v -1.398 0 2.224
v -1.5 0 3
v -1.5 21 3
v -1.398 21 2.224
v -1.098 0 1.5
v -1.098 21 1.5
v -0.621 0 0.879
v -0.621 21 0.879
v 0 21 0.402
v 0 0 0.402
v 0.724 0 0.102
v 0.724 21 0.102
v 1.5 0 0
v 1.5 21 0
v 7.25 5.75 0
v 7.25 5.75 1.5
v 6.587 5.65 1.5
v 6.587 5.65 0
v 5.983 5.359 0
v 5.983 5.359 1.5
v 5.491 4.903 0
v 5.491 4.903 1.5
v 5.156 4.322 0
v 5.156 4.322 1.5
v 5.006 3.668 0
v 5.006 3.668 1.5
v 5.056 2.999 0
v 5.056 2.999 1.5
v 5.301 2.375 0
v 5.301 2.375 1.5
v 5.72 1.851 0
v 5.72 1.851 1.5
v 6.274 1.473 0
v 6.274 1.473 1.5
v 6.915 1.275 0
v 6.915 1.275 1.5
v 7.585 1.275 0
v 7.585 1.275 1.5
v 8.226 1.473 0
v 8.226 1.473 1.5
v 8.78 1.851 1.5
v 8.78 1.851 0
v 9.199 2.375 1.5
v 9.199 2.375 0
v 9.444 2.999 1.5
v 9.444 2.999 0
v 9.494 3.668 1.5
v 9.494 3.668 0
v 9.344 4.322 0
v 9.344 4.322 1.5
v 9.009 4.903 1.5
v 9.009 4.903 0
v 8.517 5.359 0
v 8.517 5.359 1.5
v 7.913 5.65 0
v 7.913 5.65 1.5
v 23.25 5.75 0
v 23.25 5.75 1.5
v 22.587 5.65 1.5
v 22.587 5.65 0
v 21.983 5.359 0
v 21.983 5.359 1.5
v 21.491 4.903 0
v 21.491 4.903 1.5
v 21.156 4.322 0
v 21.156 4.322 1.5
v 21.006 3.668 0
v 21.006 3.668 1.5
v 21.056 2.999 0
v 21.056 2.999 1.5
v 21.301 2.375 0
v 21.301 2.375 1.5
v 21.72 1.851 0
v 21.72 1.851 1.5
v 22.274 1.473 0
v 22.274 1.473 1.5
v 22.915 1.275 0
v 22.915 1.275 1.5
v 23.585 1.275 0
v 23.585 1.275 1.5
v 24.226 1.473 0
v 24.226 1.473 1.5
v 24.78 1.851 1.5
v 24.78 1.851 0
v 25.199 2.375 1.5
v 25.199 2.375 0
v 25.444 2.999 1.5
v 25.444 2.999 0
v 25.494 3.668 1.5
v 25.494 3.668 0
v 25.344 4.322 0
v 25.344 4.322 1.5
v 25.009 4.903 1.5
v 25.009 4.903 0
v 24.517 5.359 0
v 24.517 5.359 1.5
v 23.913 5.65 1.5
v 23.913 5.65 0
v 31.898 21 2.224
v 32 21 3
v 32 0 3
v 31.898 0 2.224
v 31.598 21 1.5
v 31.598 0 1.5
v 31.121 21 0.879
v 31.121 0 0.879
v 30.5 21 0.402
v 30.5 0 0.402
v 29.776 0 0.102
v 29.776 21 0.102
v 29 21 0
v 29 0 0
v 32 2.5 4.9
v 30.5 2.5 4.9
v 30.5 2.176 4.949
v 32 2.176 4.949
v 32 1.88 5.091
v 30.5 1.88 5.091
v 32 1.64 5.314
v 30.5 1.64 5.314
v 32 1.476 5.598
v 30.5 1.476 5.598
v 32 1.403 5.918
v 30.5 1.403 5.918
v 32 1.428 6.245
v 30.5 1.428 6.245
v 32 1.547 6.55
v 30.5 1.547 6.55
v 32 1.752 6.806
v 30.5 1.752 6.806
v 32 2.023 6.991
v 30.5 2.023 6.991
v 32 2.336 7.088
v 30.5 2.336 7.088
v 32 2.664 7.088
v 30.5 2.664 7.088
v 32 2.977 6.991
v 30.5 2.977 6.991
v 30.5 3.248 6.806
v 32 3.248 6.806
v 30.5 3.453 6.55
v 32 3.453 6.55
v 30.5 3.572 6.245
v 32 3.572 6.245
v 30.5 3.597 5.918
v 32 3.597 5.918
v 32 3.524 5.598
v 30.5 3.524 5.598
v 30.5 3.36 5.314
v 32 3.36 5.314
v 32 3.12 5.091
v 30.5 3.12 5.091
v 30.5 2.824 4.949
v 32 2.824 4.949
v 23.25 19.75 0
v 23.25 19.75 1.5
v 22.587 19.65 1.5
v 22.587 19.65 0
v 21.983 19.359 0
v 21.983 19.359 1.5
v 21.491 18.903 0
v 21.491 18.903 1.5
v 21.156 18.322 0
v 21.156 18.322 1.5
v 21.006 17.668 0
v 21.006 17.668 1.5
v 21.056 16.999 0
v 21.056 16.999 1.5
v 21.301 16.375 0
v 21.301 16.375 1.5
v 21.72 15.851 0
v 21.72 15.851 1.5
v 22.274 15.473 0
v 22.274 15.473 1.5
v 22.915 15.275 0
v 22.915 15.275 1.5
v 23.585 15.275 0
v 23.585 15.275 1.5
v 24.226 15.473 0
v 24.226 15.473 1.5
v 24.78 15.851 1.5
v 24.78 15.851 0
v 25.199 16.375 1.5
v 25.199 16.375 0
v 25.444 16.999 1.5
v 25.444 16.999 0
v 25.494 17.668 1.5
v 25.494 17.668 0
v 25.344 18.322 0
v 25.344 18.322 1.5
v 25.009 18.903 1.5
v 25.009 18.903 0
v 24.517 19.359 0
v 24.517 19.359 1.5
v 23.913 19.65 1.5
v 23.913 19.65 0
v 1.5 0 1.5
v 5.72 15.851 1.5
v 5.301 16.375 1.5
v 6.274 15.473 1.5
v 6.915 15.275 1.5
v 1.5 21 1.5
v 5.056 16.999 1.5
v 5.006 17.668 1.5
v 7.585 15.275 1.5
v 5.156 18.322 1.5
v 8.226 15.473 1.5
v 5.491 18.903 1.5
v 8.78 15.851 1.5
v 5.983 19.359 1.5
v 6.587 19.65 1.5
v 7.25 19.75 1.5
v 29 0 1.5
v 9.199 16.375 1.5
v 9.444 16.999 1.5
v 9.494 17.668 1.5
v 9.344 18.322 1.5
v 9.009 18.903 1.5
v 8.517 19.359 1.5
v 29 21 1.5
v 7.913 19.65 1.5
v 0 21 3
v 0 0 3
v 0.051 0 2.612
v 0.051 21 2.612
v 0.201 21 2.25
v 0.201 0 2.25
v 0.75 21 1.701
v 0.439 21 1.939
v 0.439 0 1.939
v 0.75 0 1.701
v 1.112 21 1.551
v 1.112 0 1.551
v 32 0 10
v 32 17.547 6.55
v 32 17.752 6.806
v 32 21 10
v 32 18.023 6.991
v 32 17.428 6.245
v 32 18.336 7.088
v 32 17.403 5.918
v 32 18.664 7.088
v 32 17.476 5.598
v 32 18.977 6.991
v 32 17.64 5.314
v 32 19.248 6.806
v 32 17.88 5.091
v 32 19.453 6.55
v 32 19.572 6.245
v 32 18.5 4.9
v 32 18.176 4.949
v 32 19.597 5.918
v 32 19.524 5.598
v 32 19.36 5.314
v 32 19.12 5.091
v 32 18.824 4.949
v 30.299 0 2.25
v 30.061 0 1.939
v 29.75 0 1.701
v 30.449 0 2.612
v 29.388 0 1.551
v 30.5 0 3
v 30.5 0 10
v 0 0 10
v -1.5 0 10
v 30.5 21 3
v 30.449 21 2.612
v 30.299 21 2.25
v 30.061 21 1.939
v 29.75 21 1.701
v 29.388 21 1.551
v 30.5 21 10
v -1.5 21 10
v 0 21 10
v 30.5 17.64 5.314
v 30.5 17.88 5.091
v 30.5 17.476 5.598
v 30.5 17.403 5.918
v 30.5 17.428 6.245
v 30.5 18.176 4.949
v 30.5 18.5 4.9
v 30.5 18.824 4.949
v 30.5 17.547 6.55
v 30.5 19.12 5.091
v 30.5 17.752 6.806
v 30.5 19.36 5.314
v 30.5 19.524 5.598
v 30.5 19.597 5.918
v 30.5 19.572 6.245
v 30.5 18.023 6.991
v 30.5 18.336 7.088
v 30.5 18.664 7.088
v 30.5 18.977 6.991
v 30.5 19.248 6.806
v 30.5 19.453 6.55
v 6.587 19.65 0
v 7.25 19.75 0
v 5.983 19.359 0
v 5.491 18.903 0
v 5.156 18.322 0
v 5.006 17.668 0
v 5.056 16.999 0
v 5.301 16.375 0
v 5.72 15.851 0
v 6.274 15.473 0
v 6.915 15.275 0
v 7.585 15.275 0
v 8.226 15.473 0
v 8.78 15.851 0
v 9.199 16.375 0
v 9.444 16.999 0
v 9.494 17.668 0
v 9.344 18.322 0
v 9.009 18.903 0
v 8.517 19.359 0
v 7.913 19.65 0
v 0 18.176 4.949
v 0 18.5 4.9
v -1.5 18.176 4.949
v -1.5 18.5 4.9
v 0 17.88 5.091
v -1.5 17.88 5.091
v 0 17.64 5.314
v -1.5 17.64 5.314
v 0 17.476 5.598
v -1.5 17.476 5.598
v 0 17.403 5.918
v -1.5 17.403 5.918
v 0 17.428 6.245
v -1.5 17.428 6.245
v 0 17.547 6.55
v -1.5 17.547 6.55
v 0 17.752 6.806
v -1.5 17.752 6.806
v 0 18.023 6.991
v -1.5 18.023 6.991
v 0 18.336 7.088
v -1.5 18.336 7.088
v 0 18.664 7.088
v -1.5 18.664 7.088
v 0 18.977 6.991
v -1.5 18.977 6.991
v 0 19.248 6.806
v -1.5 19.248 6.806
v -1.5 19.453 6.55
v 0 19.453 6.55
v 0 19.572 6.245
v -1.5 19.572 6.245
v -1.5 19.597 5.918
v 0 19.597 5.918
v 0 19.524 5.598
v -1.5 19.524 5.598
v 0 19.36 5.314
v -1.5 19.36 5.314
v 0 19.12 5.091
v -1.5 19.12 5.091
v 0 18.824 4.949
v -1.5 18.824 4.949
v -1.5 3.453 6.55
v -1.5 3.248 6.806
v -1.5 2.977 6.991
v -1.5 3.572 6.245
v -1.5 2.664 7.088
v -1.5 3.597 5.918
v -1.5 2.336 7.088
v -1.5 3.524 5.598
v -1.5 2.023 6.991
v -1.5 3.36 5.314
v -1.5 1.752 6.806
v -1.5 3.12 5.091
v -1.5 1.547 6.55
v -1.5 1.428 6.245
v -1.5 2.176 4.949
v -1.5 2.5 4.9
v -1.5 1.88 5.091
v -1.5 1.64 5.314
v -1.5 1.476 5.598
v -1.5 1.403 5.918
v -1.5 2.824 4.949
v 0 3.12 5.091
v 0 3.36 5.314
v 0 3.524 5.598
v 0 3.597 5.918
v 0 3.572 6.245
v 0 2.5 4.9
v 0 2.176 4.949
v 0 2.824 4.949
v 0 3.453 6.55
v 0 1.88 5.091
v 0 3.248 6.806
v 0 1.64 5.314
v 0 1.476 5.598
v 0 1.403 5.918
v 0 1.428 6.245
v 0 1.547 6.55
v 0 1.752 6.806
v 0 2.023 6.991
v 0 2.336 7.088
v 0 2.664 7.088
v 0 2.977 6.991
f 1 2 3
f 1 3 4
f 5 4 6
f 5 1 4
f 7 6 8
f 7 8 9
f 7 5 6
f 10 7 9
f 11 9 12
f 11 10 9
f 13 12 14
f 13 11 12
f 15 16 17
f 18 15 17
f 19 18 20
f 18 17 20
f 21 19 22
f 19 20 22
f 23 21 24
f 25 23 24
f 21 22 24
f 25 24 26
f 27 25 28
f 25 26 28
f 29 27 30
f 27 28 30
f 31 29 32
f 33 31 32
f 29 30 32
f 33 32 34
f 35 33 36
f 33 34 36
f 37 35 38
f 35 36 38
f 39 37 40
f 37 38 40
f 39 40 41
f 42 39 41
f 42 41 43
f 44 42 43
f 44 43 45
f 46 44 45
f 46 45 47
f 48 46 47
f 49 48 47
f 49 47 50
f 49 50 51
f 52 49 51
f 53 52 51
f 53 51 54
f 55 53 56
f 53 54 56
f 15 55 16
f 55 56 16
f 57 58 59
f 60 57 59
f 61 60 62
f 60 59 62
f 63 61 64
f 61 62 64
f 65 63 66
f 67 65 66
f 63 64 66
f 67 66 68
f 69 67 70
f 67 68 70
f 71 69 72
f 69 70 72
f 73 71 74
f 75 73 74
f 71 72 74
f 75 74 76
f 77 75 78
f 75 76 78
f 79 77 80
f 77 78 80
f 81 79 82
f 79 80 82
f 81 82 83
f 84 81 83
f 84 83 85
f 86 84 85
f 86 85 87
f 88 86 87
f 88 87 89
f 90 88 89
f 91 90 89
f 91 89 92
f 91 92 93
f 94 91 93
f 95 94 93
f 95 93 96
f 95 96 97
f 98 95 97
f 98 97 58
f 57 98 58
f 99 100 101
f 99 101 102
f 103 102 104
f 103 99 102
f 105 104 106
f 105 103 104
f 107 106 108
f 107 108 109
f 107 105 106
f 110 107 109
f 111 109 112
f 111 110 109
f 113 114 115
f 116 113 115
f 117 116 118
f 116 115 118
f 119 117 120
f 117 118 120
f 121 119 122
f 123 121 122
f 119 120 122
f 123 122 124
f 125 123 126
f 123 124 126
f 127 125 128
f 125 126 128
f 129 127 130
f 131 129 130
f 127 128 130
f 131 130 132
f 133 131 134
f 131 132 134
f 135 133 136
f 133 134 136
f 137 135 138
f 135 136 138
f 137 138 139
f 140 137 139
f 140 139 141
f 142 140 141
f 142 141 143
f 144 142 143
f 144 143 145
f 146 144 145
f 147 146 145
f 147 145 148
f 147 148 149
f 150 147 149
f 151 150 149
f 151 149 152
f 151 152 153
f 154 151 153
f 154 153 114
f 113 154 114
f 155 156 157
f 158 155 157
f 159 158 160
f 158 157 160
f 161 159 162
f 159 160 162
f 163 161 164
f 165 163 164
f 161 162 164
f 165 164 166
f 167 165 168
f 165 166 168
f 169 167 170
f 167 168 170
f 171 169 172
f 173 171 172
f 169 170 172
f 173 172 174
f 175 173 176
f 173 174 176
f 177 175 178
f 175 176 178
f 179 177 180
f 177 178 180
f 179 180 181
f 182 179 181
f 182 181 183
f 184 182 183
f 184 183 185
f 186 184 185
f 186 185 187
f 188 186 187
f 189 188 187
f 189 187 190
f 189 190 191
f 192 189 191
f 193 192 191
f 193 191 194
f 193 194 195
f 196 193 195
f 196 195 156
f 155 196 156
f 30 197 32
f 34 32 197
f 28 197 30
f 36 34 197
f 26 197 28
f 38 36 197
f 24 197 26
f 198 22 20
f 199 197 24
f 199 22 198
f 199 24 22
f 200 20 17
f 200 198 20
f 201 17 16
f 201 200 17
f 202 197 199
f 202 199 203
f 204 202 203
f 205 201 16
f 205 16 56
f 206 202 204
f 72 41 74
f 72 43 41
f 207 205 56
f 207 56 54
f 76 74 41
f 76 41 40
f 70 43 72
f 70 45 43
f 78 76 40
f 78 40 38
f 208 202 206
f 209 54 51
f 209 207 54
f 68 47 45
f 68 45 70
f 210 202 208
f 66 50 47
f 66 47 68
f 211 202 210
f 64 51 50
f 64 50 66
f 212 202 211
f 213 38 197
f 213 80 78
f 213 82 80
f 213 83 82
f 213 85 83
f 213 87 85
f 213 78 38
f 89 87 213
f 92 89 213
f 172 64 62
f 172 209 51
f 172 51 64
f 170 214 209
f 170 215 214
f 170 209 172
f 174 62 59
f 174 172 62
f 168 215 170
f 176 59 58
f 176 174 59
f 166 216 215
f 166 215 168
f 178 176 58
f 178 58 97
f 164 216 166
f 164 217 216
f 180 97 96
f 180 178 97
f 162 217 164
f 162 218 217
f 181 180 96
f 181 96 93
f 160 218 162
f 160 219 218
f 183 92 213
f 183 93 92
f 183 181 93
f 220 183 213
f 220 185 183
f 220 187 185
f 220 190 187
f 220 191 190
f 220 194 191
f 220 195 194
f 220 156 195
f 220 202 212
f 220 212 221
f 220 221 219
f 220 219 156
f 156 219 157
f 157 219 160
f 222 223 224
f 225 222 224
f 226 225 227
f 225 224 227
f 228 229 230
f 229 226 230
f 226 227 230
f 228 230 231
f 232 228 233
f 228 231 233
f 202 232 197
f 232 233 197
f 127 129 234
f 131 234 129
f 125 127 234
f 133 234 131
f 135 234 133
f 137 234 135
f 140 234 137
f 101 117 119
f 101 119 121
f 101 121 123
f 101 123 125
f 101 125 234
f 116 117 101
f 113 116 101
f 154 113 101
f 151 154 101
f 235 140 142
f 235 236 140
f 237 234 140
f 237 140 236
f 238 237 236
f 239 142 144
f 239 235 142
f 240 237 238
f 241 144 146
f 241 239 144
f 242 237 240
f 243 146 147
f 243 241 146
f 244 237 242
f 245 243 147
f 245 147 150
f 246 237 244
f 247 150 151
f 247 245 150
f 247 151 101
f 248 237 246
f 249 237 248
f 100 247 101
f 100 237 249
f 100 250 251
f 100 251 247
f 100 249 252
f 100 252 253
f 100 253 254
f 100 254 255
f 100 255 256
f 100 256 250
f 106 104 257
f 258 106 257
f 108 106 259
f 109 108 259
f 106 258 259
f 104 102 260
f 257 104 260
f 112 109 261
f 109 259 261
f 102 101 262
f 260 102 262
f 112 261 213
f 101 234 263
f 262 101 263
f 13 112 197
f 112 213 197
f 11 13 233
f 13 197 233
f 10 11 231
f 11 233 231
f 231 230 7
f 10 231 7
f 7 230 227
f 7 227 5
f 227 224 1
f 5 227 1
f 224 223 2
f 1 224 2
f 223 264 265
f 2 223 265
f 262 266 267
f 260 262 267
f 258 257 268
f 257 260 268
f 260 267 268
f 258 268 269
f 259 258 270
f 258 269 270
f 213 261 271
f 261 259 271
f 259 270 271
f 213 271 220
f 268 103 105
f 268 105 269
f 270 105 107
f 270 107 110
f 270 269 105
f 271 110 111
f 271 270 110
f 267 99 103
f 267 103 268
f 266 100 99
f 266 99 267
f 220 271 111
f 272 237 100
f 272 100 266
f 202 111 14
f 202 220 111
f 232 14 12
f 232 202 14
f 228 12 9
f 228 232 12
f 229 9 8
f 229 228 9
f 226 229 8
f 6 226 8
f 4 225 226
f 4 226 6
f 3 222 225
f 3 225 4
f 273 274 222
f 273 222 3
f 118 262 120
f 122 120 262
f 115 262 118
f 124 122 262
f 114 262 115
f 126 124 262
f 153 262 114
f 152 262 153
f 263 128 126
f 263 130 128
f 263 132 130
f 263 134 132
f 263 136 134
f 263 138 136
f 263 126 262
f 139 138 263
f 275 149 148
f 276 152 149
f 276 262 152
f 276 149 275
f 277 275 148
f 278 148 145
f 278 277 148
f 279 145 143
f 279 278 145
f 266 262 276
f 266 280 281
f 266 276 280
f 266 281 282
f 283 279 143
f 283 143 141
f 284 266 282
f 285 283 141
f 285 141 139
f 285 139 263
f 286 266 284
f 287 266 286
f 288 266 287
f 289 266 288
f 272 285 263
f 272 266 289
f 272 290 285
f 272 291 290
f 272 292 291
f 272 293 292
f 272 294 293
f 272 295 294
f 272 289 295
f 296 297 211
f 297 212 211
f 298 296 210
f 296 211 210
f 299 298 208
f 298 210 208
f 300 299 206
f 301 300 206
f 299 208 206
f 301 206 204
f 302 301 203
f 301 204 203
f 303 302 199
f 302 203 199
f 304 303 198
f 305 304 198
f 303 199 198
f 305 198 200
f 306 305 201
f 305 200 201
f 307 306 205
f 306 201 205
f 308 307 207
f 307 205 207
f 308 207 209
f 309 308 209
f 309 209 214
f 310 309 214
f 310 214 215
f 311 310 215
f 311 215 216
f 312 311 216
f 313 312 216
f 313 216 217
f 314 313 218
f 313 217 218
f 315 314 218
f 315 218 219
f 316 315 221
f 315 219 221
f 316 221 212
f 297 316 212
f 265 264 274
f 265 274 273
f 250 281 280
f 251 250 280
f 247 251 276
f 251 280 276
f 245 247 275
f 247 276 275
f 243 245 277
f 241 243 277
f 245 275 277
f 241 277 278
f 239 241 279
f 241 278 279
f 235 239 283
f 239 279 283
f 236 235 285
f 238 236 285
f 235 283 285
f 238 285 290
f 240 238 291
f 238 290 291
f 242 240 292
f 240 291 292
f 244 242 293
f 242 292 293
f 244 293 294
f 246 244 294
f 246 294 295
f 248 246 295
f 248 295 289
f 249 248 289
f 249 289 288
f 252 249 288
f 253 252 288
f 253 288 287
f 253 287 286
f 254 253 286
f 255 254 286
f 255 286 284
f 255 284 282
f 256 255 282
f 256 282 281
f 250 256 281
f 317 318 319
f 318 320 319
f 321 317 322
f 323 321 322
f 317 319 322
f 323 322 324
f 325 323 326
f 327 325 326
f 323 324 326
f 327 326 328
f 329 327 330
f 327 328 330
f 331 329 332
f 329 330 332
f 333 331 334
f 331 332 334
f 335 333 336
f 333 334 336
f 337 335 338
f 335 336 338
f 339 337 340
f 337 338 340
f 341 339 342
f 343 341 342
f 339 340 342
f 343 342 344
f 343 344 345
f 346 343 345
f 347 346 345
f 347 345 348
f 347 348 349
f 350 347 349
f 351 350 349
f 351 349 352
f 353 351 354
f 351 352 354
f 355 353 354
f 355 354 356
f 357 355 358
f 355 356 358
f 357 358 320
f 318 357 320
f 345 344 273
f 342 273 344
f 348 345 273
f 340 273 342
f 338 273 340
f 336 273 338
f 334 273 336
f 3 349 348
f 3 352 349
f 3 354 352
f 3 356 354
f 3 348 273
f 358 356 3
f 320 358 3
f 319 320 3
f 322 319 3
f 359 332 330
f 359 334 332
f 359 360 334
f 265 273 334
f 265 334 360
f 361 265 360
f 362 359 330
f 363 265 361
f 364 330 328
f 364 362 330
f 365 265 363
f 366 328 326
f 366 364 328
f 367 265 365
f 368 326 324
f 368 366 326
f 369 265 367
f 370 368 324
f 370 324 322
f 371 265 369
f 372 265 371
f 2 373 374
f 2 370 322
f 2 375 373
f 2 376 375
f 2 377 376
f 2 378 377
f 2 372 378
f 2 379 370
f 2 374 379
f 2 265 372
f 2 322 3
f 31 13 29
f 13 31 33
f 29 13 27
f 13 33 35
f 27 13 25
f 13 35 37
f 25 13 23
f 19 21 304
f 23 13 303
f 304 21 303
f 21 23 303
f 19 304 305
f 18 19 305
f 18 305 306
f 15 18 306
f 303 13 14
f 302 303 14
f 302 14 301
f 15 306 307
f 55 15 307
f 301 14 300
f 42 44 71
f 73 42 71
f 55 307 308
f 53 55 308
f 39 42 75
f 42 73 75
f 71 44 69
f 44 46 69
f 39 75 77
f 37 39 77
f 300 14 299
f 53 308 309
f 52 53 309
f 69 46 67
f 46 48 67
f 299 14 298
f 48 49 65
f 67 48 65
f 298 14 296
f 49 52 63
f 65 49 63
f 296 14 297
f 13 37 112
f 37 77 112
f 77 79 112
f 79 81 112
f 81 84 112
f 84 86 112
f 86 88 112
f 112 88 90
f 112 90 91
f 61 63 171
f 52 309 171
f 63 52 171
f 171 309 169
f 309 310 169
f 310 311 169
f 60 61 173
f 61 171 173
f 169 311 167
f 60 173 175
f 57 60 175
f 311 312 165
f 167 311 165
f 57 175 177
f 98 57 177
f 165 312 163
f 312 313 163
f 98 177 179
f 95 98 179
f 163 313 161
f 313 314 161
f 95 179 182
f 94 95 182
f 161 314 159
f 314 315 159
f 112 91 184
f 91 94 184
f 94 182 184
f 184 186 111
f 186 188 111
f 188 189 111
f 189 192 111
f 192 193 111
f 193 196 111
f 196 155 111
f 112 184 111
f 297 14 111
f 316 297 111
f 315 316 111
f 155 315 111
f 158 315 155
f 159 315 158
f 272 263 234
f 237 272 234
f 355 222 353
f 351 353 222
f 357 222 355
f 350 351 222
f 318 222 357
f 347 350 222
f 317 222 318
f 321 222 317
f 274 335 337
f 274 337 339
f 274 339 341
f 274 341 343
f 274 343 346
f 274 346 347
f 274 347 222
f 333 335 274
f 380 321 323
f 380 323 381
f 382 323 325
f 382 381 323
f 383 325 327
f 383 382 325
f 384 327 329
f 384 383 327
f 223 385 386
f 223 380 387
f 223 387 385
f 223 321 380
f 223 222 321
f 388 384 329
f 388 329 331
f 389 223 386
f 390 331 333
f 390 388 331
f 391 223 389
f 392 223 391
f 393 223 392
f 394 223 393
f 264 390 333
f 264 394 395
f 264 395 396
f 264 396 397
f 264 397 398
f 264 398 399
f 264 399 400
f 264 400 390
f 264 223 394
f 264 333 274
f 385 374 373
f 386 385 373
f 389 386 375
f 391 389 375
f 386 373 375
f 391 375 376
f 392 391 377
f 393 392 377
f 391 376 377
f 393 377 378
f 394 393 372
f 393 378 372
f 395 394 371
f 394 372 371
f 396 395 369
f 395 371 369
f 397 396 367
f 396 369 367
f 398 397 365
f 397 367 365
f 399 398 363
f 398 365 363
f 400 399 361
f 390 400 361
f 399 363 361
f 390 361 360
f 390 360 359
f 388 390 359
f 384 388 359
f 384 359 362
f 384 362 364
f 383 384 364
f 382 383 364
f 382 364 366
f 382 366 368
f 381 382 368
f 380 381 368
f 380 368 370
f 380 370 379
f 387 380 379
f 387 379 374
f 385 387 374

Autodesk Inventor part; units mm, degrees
ref_plane "YZ Plane" through (0, 0, 0) normal (1, 0, 0) x (0, 1, 0)
ref_plane "XZ Plane" through (0, 0, 0) normal (0, 1, 0) x (-1, 0, 0)
ref_plane "XY Plane" through (0, 0, 0) normal (0, 0, 1) x (1, 0, 0)
sketch "スケッチ1" plane through (0, 0, 0) normal (0, 0, 1) x (1, 0, 0)
  line L0 (0, 0) -> (30.5, 0)
  line L1 (30.5, 0) -> (30.5, 21)
  line L2 (30.5, 21) -> (0, 21)
  line L3 (0, 21) -> (0, 0)
  dimension "d0" = 30.5
  dimension "d1" = 21
extrude "プレート1" add sketch "スケッチ1" along normal blind 1.5
sketch "スケッチ2" plane through (30.5, 21, 1.5) normal (1, 0, 0) x (0, 1, 0)
  line L0 (-21, 0) -> (0, 0)
  line L1 (0, 0) -> (0, 8.5)
  line L2 (0, 8.5) -> (-21, 8.5)
  line L3 (-21, 8.5) -> (-21, 0)
edge flange "フランジ1" height 10 angle 90 thickness 1.5 bend radius 1.5 thickness toward (1, 0, 0) relief tear relief width 1.5 relief depth 0.75 corner gap 1.5 corner form 0 edges at (30.5, 10.5, 1.5) (0, 10.5, 1.5) wall of the first edge with corners at (30.5, 0, 1.5) (30.5, 21, 1.5) (30.5, 21, 10) (30.5, 0, 10)
bend "曲げ1"
corner "コーナー1"
sketch "スケッチ3" plane through (32, 0, 10) normal (1, 0, 0) x (0, 0, -1)
  line L0 (4, 0) -> (4, 21) construction
  line L1 (7, 21) -> (0, 21) projected
  line L2 (0, 21) -> (0, 0) projected
  line L3 (0, 10.5) -> (4, 10.5)
  point P0 (10, 0)
  point P1 (4, 2.5)
  point P2 (4, 18.5)
  dimension "d15" = 4
  dimension "d16" = 16
hole "穴1" at (32, 2.5, 6) at (32, 18.5, 6) direction (-1, 0, 0) diameter 2.2 end through all
sketch "スケッチ4" plane through (0, 0, 0) normal (0, 0, -1) x (-1, 0, 0)
  line L0 (-32, 0) -> (-32, 21) projected
  line L1 (-32, 10.5) -> (1.5, 10.5)
  line L2 (1.5, 21) -> (1.5, 0) projected
  line L3 (-29, 0) -> (-1.5, 0) projected
  line L4 (-15.25, 0) -> (-15.25, 21)
  line L5 (-1.5, 21) -> (-29, 21) projected
  point P0 (0, 0)
  point P1 (-23.25, 3.5)
  point P2 (-23.25, 17.5)
  point P3 (-7.25, 3.5)
  point P4 (-7.25, 17.5)
  dimension "d31" = 14
  dimension "d32" = 16
hole "穴2" at (23.25, 3.5, 0) at (23.25, 17.5, 0) at (7.25, 3.5, 0) at (7.25, 17.5, 0) direction (0, 0, 1) diameter 4.5 end through all
equation "\"d22\" = Thickness"
equation "\"d29\" = Thickness"
equation "\"d2\" = Thickness"
equation "\"d3\" = BendReliefWidth"
equation "\"d4\" = BendReliefDepth"
equation "\"d5\" = MinimumRemnant"
equation "\"d6\" = TransitionRadius"
equation "\"d9\" = BendRadius"
equation "\"d10\" = CornerReliefSize"
equation "\"d11\" = GapSize"
equation "\"d12\" = JacobiRadiusSize"
equation "\"BendRadius\" = Thickness"
equation "\"BendReliefWidth\" = Thickness"
equation "\"BendReliefDepth\" = 0.5 * Thickness"
equation "\"CornerReliefSize\" = 4 * Thickness"
equation "\"MinimumRemnant\" = 2 * Thickness"
equation "\"TransitionRadius\" = BendRadius"
equation "\"JacobiRadiusSize\" = BendRadius"
equation "\"GapSize\" = Thickness"
equation "\"Thickness\" = 1.5"
properties part number "servo_bracket" material "アルミニウム 6061"
